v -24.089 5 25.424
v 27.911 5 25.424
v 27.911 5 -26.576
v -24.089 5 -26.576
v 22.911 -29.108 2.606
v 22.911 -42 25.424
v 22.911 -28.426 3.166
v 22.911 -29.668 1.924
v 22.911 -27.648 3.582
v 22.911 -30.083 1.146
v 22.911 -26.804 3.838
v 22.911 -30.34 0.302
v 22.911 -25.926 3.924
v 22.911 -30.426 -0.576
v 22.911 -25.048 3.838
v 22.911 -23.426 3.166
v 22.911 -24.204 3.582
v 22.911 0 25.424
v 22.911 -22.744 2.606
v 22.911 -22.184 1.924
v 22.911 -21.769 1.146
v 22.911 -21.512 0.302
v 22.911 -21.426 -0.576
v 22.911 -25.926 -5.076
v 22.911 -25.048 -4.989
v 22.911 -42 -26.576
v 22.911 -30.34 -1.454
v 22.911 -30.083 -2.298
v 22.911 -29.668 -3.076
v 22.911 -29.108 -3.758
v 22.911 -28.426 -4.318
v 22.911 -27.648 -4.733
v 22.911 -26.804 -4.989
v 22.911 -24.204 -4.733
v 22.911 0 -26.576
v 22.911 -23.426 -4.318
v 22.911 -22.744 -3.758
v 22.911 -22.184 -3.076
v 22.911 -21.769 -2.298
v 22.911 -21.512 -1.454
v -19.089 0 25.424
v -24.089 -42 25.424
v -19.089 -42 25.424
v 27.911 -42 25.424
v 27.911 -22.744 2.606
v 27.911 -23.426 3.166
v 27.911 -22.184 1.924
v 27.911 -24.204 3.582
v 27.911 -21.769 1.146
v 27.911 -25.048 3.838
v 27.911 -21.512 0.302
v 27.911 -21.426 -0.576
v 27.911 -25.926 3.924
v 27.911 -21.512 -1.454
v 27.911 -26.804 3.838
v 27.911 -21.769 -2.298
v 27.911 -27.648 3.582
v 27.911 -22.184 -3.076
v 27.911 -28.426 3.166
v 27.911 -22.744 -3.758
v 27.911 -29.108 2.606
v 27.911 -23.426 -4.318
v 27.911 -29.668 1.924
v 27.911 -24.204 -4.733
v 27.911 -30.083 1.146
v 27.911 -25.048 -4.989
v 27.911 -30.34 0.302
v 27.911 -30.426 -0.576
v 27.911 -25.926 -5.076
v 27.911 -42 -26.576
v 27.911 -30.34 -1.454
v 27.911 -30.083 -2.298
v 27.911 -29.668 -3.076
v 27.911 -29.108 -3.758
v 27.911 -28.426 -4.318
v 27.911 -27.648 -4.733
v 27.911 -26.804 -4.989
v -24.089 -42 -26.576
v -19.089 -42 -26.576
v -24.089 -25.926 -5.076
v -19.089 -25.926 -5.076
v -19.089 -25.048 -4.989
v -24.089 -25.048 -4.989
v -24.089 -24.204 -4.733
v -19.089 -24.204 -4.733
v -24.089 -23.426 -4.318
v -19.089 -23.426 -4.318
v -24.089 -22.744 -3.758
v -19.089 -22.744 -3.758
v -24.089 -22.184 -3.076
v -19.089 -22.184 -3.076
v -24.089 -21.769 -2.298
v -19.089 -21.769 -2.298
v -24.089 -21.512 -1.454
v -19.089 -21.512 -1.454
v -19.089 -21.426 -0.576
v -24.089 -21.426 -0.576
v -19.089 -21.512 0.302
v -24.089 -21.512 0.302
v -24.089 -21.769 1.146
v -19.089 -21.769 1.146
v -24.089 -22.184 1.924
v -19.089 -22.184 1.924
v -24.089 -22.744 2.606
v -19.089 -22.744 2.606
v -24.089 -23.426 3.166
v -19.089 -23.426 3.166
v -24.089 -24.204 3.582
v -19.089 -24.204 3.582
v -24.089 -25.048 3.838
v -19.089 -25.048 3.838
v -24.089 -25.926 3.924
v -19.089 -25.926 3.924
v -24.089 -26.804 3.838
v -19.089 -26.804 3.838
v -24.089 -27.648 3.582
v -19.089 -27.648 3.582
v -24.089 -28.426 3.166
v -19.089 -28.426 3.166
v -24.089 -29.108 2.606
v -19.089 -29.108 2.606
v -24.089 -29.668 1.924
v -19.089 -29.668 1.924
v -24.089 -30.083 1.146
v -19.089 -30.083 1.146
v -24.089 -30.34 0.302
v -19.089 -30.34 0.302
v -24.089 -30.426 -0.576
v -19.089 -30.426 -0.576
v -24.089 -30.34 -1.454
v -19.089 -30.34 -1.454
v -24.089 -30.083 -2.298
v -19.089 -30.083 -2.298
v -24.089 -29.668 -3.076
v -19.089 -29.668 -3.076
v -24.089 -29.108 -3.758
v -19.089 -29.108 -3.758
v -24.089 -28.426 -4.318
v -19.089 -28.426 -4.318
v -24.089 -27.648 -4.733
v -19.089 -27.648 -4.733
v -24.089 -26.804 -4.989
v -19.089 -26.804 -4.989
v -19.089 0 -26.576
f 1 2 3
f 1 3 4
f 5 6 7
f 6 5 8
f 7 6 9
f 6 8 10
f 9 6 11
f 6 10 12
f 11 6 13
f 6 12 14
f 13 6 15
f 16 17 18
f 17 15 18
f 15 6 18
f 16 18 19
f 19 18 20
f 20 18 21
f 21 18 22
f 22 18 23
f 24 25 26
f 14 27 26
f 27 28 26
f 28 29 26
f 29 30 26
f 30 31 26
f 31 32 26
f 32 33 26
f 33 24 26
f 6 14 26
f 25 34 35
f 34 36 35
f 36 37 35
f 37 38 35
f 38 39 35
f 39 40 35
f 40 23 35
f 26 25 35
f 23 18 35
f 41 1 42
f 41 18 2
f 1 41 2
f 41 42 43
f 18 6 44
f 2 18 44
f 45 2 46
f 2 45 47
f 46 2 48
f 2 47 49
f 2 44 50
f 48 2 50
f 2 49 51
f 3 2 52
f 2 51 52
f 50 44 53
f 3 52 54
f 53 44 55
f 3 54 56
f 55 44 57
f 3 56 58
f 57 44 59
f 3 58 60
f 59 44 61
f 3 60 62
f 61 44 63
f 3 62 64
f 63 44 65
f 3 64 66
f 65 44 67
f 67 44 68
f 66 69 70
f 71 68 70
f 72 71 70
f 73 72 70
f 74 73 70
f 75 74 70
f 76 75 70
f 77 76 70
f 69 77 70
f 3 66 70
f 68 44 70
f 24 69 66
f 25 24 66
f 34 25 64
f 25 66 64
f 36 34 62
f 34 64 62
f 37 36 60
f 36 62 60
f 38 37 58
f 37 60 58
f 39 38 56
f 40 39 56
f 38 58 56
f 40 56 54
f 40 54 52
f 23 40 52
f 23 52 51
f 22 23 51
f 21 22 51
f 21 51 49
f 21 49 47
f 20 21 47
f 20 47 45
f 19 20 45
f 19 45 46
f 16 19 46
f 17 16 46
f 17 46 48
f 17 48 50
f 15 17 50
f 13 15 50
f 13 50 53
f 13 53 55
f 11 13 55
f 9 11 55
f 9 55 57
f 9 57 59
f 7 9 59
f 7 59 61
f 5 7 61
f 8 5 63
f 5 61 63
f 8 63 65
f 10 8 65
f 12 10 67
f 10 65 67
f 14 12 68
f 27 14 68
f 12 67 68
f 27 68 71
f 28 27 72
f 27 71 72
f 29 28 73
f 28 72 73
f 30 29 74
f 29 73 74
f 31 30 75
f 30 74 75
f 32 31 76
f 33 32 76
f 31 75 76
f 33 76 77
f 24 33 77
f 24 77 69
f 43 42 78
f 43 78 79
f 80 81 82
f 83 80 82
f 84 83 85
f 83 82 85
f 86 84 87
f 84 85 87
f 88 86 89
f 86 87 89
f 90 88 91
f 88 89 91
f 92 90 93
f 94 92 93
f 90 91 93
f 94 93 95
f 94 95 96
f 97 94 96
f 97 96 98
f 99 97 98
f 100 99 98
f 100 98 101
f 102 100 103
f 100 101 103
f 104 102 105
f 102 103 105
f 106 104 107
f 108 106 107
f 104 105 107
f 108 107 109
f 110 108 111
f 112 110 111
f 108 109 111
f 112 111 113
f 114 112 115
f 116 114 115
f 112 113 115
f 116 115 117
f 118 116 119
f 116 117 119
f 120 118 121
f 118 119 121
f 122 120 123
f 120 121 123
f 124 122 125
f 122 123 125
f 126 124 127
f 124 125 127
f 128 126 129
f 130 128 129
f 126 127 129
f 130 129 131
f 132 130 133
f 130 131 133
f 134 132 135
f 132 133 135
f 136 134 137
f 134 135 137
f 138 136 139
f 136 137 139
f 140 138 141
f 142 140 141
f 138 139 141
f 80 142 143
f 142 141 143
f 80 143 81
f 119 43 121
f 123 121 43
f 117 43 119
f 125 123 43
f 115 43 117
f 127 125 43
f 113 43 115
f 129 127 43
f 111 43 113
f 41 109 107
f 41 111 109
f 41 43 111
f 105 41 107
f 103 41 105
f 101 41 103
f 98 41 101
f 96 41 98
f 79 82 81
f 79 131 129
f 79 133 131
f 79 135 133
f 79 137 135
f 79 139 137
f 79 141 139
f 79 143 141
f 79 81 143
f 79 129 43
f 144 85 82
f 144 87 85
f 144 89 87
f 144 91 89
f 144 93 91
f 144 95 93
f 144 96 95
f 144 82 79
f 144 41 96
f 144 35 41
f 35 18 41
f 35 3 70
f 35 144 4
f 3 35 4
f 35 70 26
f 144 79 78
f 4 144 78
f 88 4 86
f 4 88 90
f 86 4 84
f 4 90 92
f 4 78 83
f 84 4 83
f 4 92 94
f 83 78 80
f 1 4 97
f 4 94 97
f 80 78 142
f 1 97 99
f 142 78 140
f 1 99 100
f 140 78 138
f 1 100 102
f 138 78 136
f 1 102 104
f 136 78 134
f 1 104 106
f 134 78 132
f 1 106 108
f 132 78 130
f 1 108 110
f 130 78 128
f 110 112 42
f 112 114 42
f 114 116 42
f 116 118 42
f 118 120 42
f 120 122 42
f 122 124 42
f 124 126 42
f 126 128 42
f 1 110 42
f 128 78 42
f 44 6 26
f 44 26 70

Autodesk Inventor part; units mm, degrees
ref_plane "YZ Plane" through (0, 0, 0) normal (1, 0, 0) x (0, 1, 0)
ref_plane "XZ Plane" through (0, 0, 0) normal (0, 1, 0) x (-1, 0, 0)
ref_plane "XY Plane" through (0, 0, 0) normal (0, 0, 1) x (1, 0, 0)
sketch "스케치1" plane through (0, 0, 0) normal (0, 1, 0) x (-1, 0, 0)
  line L0 (24.089, 25.4241) -> (-27.911, 25.4241)
  line L1 (-27.911, 25.4241) -> (-27.911, -26.5759)
  line L2 (-27.911, -26.5759) -> (24.089, -26.5759)
  line L3 (24.089, -26.5759) -> (24.089, 25.4241)
  point P0 (0, 0)
  dimension "d0" = 52
  dimension "d1" = 52
extrude "돌출2" add sketch "스케치1" along normal blind 5
sketch "스케치2" plane through (0, 0, 0) normal (0, -1, 0) x (1, 0, 0)
  line L0 (27.911, 25.4241) -> (27.911, -26.5759) projected
  line L1 (-24.089, 25.4241) -> (27.911, 25.4241) projected
  line L2 (-24.089, -26.5759) -> (-24.089, 25.4241) projected
  line L3 (27.911, -26.5759) -> (-24.089, -26.5759) projected
  line L4 (-24.089, 25.4241) -> (-19.089, 25.4241)
  line L5 (-19.089, 25.4241) -> (-19.089, -26.5759)
  line L6 (-19.089, -26.5759) -> (-24.089, -26.5759)
  line L7 (-24.089, -26.5759) -> (-24.089, 25.4241)
  line L8 (27.911, 25.4241) -> (22.911, 25.4241)
  line L9 (22.911, 25.4241) -> (22.911, -26.5759)
  line L10 (22.911, -26.5759) -> (27.911, -26.5759)
  line L11 (27.911, -26.5759) -> (27.911, 25.4241)
  point P0 (0, 0)
  dimension "d8" = 5
  dimension "d9" = 5
extrude "돌출3" add sketch "스케치2" along normal blind 42 contours L0 L3 L9 L1 | L5 L3 L2 L1
sketch "스케치4" plane through (0, 5, 0) normal (0, 1, 0) x (1, 0, 0)
  line L0 (27.911, -25.4241) -> (27.911, 26.5759) projected
  line L1 (27.911, 26.5759) -> (-24.089, 26.5759) projected
  line L2 (-24.089, 26.5759) -> (-24.089, -25.4241) projected
  line L3 (-24.089, -25.4241) -> (27.911, -25.4241) projected
  line L4 (27.911, 26.5759) -> (38.911, 26.5759)
  line L5 (38.911, 26.5759) -> (38.911, -25.4241)
  line L6 (38.911, -25.4241) -> (27.911, -25.4241)
  line L7 (27.911, -25.4241) -> (27.911, 26.5759)
  line L8 (-24.089, 26.5759) -> (-36.089, 26.5759)
  line L9 (-36.089, 26.5759) -> (-36.089, -25.4241)
  line L10 (-36.089, -25.4241) -> (-24.089, -25.4241)
  line L11 (-24.089, -25.4241) -> (-24.089, 26.5759)
  line L12 (-24.089, 26.5759) -> (27.911, 26.5759)
  line L13 (27.911, 26.5759) -> (27.911, -25.4241)
  line L14 (27.911, -25.4241) -> (-24.089, -25.4241)
  line L15 (-24.089, -25.4241) -> (-24.089, 26.5759)
  line L16 (-24.089, -15.4219) -> (-4.089, -25.4241)
  point P0 (0, 0)
  point P1 (-24.089, -25.4241)
  dimension "d12" = 11
  dimension "d13" = 12
  dimension "d32" = 0
  dimension "d33" = 52
  dimension "d34" = 52
  dimension "d35" = 0
  dimension "d36" = 52
  dimension "d37" = 52
  dimension "d38" = 26.57
  dimension "d39" = 20
sketch "스케치8" plane through (27.911, -42, 25.4241) normal (1, 0, 0) x (0, 0, -1)
  line L0 (52, 0) -> (52, 47) projected
  line L1 (0, 47) -> (52, 47) projected
  line L2 (0, 47) -> (0, 0) projected
  line L3 (52, 0) -> (0, 0) projected
  circle A0 centre (26, 16.074) radius 4.5
  point P0 (25.4241, 42)
  point P1 (26, 0)
  dimension "d26" = 9
  dimension "d27" = 16.074
extrude "돌출8" cut sketch "스케치8" along normal mid plane 150 contours A0
properties part number "new_camera_case_front"
